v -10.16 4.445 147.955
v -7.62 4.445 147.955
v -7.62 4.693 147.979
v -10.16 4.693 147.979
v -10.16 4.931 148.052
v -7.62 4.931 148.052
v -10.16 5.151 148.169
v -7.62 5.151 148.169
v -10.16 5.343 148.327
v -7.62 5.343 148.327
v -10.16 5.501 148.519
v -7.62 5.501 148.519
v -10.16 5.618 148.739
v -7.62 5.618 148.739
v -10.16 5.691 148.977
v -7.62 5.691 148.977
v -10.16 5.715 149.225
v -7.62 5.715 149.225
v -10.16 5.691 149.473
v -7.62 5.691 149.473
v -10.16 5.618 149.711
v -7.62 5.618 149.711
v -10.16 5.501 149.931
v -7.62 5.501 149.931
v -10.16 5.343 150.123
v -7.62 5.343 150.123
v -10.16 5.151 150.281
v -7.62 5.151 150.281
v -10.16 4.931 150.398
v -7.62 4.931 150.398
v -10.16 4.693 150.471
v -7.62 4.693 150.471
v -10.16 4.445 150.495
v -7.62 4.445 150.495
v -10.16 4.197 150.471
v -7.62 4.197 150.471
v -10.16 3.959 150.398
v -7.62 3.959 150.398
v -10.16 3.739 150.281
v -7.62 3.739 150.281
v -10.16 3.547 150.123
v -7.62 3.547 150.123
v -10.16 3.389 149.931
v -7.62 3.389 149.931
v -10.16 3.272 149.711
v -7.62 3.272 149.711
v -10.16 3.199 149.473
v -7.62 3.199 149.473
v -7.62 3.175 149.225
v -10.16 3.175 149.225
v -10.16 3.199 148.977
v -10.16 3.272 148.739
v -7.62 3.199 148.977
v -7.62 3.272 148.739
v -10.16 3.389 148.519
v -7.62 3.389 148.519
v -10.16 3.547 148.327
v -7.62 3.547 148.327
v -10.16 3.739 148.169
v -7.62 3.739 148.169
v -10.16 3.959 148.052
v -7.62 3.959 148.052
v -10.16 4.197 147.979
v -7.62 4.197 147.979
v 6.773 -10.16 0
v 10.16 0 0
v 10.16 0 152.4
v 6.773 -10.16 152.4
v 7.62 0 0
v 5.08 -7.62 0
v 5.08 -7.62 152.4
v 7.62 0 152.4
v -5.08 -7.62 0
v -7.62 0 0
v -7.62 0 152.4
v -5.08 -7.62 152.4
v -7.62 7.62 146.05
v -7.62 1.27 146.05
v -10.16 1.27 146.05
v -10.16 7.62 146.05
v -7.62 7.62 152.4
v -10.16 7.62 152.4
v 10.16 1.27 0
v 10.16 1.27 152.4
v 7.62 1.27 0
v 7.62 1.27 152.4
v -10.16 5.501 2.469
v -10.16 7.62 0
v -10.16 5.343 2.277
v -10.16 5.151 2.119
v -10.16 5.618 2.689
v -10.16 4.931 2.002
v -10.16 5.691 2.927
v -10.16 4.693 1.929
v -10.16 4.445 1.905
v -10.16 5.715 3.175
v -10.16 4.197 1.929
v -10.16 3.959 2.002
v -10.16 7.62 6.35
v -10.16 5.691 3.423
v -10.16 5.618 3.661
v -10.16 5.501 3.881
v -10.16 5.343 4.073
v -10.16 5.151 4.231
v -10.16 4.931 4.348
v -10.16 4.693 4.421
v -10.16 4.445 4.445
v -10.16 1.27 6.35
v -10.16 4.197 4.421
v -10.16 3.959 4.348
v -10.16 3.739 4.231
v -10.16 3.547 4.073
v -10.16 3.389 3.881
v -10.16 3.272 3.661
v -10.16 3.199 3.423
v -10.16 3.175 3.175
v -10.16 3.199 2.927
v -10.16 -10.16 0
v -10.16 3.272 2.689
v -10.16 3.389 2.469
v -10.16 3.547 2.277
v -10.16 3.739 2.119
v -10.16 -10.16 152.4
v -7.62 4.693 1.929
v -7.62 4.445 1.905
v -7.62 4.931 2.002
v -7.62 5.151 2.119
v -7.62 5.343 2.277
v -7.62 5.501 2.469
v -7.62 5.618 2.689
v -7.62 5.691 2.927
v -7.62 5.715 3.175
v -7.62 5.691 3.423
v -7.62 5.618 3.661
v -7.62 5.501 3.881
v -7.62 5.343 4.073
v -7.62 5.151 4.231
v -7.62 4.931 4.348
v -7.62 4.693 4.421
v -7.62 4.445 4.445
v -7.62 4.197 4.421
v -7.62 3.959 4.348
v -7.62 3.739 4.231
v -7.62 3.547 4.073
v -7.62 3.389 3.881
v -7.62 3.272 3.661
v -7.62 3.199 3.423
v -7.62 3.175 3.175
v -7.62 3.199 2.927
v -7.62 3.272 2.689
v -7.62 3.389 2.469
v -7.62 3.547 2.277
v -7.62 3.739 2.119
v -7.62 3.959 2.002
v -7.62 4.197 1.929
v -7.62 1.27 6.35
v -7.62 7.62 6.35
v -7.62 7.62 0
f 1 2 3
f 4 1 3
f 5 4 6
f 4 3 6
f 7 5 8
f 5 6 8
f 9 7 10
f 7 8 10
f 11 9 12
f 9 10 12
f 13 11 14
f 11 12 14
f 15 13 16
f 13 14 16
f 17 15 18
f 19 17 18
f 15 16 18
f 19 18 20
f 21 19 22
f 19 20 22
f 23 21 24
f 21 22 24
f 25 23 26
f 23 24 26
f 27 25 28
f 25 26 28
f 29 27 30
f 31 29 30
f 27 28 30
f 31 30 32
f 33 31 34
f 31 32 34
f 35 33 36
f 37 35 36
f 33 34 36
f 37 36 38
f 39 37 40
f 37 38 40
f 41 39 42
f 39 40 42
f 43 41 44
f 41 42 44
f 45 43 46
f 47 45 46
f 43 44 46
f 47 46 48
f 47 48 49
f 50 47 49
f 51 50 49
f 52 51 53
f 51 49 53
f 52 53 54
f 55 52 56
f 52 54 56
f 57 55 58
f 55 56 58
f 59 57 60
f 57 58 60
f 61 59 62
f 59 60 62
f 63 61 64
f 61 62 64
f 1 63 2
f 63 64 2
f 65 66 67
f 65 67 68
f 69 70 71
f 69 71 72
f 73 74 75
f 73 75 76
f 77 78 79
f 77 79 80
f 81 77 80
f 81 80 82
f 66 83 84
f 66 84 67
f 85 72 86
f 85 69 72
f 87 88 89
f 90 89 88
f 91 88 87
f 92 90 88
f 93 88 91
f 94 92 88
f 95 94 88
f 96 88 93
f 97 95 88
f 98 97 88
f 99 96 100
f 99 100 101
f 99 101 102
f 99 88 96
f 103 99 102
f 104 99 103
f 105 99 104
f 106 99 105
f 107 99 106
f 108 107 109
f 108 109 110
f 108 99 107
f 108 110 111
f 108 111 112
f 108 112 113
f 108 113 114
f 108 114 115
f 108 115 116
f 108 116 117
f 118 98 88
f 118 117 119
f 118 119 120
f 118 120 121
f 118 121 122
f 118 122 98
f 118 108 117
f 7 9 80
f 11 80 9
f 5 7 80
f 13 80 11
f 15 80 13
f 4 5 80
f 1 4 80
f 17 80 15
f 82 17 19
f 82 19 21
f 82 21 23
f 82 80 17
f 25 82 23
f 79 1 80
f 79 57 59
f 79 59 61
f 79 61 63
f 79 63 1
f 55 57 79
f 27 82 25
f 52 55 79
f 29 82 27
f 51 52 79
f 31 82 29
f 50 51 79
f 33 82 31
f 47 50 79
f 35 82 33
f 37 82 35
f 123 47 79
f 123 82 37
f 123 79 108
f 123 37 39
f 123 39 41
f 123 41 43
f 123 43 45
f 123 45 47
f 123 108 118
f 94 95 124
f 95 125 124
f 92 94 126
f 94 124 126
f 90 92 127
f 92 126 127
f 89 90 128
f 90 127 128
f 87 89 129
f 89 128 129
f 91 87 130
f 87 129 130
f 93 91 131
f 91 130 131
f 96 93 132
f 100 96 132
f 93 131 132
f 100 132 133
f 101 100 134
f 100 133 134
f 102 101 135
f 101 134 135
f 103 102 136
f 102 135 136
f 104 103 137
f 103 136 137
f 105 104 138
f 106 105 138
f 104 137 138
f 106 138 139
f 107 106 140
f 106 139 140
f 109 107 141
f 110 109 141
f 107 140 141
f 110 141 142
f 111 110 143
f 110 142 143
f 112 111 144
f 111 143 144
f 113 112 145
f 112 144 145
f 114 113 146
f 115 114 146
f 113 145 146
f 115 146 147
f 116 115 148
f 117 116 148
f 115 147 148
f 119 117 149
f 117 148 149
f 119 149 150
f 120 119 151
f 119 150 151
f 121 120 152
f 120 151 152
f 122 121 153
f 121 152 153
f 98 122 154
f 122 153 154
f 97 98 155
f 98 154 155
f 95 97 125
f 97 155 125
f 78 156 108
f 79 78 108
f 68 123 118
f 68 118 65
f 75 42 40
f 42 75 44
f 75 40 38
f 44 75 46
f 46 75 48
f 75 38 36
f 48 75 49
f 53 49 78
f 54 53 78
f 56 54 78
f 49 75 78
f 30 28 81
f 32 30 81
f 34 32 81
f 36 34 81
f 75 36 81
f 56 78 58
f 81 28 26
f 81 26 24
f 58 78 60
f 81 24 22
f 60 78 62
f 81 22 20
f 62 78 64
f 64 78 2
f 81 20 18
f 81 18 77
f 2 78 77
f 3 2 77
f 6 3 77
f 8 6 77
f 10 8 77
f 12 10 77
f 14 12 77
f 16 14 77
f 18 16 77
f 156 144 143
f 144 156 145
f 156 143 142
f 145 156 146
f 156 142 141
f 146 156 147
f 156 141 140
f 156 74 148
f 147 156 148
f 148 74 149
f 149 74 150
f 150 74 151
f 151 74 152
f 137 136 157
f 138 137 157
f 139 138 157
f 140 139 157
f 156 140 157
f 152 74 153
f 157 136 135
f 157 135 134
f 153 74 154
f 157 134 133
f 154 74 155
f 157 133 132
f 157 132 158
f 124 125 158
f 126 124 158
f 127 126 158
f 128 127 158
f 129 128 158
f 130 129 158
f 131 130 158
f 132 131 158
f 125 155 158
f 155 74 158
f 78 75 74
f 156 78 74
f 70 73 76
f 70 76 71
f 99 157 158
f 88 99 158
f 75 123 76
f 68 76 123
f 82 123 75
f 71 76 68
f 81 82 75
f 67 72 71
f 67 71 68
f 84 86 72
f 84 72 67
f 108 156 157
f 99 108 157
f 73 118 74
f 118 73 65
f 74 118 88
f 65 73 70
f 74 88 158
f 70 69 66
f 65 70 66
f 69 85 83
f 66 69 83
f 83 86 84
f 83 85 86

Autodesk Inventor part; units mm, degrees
ref_plane "YZ Plane" through (0, 0, 0) normal (1, 0, 0) x (0, 1, 0)
ref_plane "XZ Plane" through (0, 0, 0) normal (0, 1, 0) x (-1, 0, 0)
ref_plane "XY Plane" through (0, 0, 0) normal (0, 0, 1) x (1, 0, 0)
sketch "Sketch1" plane through (0, 0, 0) normal (0, 0, 1) x (1, 0, 0)
  circle A0 centre (0, 0) radius 7.62
  line L0 (-7.62, 0) -> (-7.62, 1.27)
  line L1 (0, -7.62) -> (-5.08, -7.62)
  line L2 (0, -7.62) -> (5.08, -7.62)
  line L3 (-7.62, 0) -> (-5.08, -7.62)
  line L4 (5.08, -7.62) -> (7.62, 0)
  line L5 (7.62, 0) -> (7.62, 1.27)
  line L6 (-7.62, 1.27) -> (-10.16, 1.27)
  line L7 (-10.16, 1.27) -> (-10.16, 0)
  line L8 (-5.08, -7.62) -> (-6.7733, -10.16)
  line L9 (-6.7733, -10.16) -> (-10.16, 0)
  line L10 (7.62, 1.27) -> (10.16, 1.27)
  line L11 (10.16, 1.27) -> (10.16, 0)
  line L12 (10.16, 0) -> (6.7733, -10.16)
  line L13 (6.7733, -10.16) -> (-6.7733, -10.16)
  line L14 (5.08, -7.62) -> (6.7733, -10.16)
  dimension "d0" = 15.24
  dimension "d1" = 1.27
  dimension "d2" = 5.08
  dimension "d3" = 5.08
  dimension "d4" = 1.27
  dimension "d6" = 2.54
  dimension "d7" = 2.54
  dimension "d8" = 2.54
extrude "Extrusion1" add sketch "Sketch1" along normal blind 152.4 contours L5 L10 L11 L12 L14 L4 A0 | A0 L4 | L3 A0 | A0 L3 L8 L9 L7 L6 L0 | L2 L14 L13 L8 L1
sketch "Sketch2" plane through (-7.62, 1.27, 152.4) normal (1, 0, 0) x (0, 0, -1)
  point P0 (152.4, -1.27)
sketch "Sketch3" plane through (0, 0, 152.4) normal (0, 0, 1) x (1, 0, 0)
  line L0 (-10.16, 1.27) -> (-10.16, 0) projected
  line L1 (-10.16, 0) -> (-10.16, -10.16)
  line L2 (-6.7733, -10.16) -> (6.7733, -10.16) projected
  line L3 (-10.16, -10.16) -> (-6.7733, -10.16)
  line L4 (-10.16, 0) -> (-6.7733, -10.16) projected
  point P0 (0, 0)
extrude "Extrusion2" add sketch "Sketch3" against normal up to surface (152.4 mm away)
sketch "Sketch4" plane through (-7.62, 1.27, 152.4) normal (1, 0, 0) x (0, 0, -1)
  line L0 (152.4, -1.27) -> (152.4, 0) projected
  line L1 (152.4, 0) -> (146.05, 0)
  line L2 (146.05, 0) -> (146.05, 6.35)
  line L3 (146.05, 6.35) -> (152.4, 6.35)
  line L4 (152.4, 6.35) -> (152.4, 0)
  circle A0 centre (149.225, 3.175) radius 1.27
  line L5 (152.4, 0) -> (0, 0) projected
  line L6 (76.2, 0) -> (76.2, 6.35)
  line L7 (76.2, 0) -> (82.55, 0) construction
  line L8 (6.35, 0) -> (6.35, 6.35)
  line L9 (6.35, 6.35) -> (0, 6.35)
  line L10 (0, 6.35) -> (0, 0)
  circle A1 centre (3.175, 3.175) radius 1.27
  dimension "d13" = 6.35
  dimension "d14" = 6.35
  dimension "d15" = 2.54
  dimension "d16" = 3.175
  dimension "d17" = 3.175
  dimension "d18" = 6.35
  dimension "d19" = 90
extrude "Extrusion3" add sketch "Sketch4" against normal up to surface (2.54 mm away)
properties part number "StraightTrackv2"
